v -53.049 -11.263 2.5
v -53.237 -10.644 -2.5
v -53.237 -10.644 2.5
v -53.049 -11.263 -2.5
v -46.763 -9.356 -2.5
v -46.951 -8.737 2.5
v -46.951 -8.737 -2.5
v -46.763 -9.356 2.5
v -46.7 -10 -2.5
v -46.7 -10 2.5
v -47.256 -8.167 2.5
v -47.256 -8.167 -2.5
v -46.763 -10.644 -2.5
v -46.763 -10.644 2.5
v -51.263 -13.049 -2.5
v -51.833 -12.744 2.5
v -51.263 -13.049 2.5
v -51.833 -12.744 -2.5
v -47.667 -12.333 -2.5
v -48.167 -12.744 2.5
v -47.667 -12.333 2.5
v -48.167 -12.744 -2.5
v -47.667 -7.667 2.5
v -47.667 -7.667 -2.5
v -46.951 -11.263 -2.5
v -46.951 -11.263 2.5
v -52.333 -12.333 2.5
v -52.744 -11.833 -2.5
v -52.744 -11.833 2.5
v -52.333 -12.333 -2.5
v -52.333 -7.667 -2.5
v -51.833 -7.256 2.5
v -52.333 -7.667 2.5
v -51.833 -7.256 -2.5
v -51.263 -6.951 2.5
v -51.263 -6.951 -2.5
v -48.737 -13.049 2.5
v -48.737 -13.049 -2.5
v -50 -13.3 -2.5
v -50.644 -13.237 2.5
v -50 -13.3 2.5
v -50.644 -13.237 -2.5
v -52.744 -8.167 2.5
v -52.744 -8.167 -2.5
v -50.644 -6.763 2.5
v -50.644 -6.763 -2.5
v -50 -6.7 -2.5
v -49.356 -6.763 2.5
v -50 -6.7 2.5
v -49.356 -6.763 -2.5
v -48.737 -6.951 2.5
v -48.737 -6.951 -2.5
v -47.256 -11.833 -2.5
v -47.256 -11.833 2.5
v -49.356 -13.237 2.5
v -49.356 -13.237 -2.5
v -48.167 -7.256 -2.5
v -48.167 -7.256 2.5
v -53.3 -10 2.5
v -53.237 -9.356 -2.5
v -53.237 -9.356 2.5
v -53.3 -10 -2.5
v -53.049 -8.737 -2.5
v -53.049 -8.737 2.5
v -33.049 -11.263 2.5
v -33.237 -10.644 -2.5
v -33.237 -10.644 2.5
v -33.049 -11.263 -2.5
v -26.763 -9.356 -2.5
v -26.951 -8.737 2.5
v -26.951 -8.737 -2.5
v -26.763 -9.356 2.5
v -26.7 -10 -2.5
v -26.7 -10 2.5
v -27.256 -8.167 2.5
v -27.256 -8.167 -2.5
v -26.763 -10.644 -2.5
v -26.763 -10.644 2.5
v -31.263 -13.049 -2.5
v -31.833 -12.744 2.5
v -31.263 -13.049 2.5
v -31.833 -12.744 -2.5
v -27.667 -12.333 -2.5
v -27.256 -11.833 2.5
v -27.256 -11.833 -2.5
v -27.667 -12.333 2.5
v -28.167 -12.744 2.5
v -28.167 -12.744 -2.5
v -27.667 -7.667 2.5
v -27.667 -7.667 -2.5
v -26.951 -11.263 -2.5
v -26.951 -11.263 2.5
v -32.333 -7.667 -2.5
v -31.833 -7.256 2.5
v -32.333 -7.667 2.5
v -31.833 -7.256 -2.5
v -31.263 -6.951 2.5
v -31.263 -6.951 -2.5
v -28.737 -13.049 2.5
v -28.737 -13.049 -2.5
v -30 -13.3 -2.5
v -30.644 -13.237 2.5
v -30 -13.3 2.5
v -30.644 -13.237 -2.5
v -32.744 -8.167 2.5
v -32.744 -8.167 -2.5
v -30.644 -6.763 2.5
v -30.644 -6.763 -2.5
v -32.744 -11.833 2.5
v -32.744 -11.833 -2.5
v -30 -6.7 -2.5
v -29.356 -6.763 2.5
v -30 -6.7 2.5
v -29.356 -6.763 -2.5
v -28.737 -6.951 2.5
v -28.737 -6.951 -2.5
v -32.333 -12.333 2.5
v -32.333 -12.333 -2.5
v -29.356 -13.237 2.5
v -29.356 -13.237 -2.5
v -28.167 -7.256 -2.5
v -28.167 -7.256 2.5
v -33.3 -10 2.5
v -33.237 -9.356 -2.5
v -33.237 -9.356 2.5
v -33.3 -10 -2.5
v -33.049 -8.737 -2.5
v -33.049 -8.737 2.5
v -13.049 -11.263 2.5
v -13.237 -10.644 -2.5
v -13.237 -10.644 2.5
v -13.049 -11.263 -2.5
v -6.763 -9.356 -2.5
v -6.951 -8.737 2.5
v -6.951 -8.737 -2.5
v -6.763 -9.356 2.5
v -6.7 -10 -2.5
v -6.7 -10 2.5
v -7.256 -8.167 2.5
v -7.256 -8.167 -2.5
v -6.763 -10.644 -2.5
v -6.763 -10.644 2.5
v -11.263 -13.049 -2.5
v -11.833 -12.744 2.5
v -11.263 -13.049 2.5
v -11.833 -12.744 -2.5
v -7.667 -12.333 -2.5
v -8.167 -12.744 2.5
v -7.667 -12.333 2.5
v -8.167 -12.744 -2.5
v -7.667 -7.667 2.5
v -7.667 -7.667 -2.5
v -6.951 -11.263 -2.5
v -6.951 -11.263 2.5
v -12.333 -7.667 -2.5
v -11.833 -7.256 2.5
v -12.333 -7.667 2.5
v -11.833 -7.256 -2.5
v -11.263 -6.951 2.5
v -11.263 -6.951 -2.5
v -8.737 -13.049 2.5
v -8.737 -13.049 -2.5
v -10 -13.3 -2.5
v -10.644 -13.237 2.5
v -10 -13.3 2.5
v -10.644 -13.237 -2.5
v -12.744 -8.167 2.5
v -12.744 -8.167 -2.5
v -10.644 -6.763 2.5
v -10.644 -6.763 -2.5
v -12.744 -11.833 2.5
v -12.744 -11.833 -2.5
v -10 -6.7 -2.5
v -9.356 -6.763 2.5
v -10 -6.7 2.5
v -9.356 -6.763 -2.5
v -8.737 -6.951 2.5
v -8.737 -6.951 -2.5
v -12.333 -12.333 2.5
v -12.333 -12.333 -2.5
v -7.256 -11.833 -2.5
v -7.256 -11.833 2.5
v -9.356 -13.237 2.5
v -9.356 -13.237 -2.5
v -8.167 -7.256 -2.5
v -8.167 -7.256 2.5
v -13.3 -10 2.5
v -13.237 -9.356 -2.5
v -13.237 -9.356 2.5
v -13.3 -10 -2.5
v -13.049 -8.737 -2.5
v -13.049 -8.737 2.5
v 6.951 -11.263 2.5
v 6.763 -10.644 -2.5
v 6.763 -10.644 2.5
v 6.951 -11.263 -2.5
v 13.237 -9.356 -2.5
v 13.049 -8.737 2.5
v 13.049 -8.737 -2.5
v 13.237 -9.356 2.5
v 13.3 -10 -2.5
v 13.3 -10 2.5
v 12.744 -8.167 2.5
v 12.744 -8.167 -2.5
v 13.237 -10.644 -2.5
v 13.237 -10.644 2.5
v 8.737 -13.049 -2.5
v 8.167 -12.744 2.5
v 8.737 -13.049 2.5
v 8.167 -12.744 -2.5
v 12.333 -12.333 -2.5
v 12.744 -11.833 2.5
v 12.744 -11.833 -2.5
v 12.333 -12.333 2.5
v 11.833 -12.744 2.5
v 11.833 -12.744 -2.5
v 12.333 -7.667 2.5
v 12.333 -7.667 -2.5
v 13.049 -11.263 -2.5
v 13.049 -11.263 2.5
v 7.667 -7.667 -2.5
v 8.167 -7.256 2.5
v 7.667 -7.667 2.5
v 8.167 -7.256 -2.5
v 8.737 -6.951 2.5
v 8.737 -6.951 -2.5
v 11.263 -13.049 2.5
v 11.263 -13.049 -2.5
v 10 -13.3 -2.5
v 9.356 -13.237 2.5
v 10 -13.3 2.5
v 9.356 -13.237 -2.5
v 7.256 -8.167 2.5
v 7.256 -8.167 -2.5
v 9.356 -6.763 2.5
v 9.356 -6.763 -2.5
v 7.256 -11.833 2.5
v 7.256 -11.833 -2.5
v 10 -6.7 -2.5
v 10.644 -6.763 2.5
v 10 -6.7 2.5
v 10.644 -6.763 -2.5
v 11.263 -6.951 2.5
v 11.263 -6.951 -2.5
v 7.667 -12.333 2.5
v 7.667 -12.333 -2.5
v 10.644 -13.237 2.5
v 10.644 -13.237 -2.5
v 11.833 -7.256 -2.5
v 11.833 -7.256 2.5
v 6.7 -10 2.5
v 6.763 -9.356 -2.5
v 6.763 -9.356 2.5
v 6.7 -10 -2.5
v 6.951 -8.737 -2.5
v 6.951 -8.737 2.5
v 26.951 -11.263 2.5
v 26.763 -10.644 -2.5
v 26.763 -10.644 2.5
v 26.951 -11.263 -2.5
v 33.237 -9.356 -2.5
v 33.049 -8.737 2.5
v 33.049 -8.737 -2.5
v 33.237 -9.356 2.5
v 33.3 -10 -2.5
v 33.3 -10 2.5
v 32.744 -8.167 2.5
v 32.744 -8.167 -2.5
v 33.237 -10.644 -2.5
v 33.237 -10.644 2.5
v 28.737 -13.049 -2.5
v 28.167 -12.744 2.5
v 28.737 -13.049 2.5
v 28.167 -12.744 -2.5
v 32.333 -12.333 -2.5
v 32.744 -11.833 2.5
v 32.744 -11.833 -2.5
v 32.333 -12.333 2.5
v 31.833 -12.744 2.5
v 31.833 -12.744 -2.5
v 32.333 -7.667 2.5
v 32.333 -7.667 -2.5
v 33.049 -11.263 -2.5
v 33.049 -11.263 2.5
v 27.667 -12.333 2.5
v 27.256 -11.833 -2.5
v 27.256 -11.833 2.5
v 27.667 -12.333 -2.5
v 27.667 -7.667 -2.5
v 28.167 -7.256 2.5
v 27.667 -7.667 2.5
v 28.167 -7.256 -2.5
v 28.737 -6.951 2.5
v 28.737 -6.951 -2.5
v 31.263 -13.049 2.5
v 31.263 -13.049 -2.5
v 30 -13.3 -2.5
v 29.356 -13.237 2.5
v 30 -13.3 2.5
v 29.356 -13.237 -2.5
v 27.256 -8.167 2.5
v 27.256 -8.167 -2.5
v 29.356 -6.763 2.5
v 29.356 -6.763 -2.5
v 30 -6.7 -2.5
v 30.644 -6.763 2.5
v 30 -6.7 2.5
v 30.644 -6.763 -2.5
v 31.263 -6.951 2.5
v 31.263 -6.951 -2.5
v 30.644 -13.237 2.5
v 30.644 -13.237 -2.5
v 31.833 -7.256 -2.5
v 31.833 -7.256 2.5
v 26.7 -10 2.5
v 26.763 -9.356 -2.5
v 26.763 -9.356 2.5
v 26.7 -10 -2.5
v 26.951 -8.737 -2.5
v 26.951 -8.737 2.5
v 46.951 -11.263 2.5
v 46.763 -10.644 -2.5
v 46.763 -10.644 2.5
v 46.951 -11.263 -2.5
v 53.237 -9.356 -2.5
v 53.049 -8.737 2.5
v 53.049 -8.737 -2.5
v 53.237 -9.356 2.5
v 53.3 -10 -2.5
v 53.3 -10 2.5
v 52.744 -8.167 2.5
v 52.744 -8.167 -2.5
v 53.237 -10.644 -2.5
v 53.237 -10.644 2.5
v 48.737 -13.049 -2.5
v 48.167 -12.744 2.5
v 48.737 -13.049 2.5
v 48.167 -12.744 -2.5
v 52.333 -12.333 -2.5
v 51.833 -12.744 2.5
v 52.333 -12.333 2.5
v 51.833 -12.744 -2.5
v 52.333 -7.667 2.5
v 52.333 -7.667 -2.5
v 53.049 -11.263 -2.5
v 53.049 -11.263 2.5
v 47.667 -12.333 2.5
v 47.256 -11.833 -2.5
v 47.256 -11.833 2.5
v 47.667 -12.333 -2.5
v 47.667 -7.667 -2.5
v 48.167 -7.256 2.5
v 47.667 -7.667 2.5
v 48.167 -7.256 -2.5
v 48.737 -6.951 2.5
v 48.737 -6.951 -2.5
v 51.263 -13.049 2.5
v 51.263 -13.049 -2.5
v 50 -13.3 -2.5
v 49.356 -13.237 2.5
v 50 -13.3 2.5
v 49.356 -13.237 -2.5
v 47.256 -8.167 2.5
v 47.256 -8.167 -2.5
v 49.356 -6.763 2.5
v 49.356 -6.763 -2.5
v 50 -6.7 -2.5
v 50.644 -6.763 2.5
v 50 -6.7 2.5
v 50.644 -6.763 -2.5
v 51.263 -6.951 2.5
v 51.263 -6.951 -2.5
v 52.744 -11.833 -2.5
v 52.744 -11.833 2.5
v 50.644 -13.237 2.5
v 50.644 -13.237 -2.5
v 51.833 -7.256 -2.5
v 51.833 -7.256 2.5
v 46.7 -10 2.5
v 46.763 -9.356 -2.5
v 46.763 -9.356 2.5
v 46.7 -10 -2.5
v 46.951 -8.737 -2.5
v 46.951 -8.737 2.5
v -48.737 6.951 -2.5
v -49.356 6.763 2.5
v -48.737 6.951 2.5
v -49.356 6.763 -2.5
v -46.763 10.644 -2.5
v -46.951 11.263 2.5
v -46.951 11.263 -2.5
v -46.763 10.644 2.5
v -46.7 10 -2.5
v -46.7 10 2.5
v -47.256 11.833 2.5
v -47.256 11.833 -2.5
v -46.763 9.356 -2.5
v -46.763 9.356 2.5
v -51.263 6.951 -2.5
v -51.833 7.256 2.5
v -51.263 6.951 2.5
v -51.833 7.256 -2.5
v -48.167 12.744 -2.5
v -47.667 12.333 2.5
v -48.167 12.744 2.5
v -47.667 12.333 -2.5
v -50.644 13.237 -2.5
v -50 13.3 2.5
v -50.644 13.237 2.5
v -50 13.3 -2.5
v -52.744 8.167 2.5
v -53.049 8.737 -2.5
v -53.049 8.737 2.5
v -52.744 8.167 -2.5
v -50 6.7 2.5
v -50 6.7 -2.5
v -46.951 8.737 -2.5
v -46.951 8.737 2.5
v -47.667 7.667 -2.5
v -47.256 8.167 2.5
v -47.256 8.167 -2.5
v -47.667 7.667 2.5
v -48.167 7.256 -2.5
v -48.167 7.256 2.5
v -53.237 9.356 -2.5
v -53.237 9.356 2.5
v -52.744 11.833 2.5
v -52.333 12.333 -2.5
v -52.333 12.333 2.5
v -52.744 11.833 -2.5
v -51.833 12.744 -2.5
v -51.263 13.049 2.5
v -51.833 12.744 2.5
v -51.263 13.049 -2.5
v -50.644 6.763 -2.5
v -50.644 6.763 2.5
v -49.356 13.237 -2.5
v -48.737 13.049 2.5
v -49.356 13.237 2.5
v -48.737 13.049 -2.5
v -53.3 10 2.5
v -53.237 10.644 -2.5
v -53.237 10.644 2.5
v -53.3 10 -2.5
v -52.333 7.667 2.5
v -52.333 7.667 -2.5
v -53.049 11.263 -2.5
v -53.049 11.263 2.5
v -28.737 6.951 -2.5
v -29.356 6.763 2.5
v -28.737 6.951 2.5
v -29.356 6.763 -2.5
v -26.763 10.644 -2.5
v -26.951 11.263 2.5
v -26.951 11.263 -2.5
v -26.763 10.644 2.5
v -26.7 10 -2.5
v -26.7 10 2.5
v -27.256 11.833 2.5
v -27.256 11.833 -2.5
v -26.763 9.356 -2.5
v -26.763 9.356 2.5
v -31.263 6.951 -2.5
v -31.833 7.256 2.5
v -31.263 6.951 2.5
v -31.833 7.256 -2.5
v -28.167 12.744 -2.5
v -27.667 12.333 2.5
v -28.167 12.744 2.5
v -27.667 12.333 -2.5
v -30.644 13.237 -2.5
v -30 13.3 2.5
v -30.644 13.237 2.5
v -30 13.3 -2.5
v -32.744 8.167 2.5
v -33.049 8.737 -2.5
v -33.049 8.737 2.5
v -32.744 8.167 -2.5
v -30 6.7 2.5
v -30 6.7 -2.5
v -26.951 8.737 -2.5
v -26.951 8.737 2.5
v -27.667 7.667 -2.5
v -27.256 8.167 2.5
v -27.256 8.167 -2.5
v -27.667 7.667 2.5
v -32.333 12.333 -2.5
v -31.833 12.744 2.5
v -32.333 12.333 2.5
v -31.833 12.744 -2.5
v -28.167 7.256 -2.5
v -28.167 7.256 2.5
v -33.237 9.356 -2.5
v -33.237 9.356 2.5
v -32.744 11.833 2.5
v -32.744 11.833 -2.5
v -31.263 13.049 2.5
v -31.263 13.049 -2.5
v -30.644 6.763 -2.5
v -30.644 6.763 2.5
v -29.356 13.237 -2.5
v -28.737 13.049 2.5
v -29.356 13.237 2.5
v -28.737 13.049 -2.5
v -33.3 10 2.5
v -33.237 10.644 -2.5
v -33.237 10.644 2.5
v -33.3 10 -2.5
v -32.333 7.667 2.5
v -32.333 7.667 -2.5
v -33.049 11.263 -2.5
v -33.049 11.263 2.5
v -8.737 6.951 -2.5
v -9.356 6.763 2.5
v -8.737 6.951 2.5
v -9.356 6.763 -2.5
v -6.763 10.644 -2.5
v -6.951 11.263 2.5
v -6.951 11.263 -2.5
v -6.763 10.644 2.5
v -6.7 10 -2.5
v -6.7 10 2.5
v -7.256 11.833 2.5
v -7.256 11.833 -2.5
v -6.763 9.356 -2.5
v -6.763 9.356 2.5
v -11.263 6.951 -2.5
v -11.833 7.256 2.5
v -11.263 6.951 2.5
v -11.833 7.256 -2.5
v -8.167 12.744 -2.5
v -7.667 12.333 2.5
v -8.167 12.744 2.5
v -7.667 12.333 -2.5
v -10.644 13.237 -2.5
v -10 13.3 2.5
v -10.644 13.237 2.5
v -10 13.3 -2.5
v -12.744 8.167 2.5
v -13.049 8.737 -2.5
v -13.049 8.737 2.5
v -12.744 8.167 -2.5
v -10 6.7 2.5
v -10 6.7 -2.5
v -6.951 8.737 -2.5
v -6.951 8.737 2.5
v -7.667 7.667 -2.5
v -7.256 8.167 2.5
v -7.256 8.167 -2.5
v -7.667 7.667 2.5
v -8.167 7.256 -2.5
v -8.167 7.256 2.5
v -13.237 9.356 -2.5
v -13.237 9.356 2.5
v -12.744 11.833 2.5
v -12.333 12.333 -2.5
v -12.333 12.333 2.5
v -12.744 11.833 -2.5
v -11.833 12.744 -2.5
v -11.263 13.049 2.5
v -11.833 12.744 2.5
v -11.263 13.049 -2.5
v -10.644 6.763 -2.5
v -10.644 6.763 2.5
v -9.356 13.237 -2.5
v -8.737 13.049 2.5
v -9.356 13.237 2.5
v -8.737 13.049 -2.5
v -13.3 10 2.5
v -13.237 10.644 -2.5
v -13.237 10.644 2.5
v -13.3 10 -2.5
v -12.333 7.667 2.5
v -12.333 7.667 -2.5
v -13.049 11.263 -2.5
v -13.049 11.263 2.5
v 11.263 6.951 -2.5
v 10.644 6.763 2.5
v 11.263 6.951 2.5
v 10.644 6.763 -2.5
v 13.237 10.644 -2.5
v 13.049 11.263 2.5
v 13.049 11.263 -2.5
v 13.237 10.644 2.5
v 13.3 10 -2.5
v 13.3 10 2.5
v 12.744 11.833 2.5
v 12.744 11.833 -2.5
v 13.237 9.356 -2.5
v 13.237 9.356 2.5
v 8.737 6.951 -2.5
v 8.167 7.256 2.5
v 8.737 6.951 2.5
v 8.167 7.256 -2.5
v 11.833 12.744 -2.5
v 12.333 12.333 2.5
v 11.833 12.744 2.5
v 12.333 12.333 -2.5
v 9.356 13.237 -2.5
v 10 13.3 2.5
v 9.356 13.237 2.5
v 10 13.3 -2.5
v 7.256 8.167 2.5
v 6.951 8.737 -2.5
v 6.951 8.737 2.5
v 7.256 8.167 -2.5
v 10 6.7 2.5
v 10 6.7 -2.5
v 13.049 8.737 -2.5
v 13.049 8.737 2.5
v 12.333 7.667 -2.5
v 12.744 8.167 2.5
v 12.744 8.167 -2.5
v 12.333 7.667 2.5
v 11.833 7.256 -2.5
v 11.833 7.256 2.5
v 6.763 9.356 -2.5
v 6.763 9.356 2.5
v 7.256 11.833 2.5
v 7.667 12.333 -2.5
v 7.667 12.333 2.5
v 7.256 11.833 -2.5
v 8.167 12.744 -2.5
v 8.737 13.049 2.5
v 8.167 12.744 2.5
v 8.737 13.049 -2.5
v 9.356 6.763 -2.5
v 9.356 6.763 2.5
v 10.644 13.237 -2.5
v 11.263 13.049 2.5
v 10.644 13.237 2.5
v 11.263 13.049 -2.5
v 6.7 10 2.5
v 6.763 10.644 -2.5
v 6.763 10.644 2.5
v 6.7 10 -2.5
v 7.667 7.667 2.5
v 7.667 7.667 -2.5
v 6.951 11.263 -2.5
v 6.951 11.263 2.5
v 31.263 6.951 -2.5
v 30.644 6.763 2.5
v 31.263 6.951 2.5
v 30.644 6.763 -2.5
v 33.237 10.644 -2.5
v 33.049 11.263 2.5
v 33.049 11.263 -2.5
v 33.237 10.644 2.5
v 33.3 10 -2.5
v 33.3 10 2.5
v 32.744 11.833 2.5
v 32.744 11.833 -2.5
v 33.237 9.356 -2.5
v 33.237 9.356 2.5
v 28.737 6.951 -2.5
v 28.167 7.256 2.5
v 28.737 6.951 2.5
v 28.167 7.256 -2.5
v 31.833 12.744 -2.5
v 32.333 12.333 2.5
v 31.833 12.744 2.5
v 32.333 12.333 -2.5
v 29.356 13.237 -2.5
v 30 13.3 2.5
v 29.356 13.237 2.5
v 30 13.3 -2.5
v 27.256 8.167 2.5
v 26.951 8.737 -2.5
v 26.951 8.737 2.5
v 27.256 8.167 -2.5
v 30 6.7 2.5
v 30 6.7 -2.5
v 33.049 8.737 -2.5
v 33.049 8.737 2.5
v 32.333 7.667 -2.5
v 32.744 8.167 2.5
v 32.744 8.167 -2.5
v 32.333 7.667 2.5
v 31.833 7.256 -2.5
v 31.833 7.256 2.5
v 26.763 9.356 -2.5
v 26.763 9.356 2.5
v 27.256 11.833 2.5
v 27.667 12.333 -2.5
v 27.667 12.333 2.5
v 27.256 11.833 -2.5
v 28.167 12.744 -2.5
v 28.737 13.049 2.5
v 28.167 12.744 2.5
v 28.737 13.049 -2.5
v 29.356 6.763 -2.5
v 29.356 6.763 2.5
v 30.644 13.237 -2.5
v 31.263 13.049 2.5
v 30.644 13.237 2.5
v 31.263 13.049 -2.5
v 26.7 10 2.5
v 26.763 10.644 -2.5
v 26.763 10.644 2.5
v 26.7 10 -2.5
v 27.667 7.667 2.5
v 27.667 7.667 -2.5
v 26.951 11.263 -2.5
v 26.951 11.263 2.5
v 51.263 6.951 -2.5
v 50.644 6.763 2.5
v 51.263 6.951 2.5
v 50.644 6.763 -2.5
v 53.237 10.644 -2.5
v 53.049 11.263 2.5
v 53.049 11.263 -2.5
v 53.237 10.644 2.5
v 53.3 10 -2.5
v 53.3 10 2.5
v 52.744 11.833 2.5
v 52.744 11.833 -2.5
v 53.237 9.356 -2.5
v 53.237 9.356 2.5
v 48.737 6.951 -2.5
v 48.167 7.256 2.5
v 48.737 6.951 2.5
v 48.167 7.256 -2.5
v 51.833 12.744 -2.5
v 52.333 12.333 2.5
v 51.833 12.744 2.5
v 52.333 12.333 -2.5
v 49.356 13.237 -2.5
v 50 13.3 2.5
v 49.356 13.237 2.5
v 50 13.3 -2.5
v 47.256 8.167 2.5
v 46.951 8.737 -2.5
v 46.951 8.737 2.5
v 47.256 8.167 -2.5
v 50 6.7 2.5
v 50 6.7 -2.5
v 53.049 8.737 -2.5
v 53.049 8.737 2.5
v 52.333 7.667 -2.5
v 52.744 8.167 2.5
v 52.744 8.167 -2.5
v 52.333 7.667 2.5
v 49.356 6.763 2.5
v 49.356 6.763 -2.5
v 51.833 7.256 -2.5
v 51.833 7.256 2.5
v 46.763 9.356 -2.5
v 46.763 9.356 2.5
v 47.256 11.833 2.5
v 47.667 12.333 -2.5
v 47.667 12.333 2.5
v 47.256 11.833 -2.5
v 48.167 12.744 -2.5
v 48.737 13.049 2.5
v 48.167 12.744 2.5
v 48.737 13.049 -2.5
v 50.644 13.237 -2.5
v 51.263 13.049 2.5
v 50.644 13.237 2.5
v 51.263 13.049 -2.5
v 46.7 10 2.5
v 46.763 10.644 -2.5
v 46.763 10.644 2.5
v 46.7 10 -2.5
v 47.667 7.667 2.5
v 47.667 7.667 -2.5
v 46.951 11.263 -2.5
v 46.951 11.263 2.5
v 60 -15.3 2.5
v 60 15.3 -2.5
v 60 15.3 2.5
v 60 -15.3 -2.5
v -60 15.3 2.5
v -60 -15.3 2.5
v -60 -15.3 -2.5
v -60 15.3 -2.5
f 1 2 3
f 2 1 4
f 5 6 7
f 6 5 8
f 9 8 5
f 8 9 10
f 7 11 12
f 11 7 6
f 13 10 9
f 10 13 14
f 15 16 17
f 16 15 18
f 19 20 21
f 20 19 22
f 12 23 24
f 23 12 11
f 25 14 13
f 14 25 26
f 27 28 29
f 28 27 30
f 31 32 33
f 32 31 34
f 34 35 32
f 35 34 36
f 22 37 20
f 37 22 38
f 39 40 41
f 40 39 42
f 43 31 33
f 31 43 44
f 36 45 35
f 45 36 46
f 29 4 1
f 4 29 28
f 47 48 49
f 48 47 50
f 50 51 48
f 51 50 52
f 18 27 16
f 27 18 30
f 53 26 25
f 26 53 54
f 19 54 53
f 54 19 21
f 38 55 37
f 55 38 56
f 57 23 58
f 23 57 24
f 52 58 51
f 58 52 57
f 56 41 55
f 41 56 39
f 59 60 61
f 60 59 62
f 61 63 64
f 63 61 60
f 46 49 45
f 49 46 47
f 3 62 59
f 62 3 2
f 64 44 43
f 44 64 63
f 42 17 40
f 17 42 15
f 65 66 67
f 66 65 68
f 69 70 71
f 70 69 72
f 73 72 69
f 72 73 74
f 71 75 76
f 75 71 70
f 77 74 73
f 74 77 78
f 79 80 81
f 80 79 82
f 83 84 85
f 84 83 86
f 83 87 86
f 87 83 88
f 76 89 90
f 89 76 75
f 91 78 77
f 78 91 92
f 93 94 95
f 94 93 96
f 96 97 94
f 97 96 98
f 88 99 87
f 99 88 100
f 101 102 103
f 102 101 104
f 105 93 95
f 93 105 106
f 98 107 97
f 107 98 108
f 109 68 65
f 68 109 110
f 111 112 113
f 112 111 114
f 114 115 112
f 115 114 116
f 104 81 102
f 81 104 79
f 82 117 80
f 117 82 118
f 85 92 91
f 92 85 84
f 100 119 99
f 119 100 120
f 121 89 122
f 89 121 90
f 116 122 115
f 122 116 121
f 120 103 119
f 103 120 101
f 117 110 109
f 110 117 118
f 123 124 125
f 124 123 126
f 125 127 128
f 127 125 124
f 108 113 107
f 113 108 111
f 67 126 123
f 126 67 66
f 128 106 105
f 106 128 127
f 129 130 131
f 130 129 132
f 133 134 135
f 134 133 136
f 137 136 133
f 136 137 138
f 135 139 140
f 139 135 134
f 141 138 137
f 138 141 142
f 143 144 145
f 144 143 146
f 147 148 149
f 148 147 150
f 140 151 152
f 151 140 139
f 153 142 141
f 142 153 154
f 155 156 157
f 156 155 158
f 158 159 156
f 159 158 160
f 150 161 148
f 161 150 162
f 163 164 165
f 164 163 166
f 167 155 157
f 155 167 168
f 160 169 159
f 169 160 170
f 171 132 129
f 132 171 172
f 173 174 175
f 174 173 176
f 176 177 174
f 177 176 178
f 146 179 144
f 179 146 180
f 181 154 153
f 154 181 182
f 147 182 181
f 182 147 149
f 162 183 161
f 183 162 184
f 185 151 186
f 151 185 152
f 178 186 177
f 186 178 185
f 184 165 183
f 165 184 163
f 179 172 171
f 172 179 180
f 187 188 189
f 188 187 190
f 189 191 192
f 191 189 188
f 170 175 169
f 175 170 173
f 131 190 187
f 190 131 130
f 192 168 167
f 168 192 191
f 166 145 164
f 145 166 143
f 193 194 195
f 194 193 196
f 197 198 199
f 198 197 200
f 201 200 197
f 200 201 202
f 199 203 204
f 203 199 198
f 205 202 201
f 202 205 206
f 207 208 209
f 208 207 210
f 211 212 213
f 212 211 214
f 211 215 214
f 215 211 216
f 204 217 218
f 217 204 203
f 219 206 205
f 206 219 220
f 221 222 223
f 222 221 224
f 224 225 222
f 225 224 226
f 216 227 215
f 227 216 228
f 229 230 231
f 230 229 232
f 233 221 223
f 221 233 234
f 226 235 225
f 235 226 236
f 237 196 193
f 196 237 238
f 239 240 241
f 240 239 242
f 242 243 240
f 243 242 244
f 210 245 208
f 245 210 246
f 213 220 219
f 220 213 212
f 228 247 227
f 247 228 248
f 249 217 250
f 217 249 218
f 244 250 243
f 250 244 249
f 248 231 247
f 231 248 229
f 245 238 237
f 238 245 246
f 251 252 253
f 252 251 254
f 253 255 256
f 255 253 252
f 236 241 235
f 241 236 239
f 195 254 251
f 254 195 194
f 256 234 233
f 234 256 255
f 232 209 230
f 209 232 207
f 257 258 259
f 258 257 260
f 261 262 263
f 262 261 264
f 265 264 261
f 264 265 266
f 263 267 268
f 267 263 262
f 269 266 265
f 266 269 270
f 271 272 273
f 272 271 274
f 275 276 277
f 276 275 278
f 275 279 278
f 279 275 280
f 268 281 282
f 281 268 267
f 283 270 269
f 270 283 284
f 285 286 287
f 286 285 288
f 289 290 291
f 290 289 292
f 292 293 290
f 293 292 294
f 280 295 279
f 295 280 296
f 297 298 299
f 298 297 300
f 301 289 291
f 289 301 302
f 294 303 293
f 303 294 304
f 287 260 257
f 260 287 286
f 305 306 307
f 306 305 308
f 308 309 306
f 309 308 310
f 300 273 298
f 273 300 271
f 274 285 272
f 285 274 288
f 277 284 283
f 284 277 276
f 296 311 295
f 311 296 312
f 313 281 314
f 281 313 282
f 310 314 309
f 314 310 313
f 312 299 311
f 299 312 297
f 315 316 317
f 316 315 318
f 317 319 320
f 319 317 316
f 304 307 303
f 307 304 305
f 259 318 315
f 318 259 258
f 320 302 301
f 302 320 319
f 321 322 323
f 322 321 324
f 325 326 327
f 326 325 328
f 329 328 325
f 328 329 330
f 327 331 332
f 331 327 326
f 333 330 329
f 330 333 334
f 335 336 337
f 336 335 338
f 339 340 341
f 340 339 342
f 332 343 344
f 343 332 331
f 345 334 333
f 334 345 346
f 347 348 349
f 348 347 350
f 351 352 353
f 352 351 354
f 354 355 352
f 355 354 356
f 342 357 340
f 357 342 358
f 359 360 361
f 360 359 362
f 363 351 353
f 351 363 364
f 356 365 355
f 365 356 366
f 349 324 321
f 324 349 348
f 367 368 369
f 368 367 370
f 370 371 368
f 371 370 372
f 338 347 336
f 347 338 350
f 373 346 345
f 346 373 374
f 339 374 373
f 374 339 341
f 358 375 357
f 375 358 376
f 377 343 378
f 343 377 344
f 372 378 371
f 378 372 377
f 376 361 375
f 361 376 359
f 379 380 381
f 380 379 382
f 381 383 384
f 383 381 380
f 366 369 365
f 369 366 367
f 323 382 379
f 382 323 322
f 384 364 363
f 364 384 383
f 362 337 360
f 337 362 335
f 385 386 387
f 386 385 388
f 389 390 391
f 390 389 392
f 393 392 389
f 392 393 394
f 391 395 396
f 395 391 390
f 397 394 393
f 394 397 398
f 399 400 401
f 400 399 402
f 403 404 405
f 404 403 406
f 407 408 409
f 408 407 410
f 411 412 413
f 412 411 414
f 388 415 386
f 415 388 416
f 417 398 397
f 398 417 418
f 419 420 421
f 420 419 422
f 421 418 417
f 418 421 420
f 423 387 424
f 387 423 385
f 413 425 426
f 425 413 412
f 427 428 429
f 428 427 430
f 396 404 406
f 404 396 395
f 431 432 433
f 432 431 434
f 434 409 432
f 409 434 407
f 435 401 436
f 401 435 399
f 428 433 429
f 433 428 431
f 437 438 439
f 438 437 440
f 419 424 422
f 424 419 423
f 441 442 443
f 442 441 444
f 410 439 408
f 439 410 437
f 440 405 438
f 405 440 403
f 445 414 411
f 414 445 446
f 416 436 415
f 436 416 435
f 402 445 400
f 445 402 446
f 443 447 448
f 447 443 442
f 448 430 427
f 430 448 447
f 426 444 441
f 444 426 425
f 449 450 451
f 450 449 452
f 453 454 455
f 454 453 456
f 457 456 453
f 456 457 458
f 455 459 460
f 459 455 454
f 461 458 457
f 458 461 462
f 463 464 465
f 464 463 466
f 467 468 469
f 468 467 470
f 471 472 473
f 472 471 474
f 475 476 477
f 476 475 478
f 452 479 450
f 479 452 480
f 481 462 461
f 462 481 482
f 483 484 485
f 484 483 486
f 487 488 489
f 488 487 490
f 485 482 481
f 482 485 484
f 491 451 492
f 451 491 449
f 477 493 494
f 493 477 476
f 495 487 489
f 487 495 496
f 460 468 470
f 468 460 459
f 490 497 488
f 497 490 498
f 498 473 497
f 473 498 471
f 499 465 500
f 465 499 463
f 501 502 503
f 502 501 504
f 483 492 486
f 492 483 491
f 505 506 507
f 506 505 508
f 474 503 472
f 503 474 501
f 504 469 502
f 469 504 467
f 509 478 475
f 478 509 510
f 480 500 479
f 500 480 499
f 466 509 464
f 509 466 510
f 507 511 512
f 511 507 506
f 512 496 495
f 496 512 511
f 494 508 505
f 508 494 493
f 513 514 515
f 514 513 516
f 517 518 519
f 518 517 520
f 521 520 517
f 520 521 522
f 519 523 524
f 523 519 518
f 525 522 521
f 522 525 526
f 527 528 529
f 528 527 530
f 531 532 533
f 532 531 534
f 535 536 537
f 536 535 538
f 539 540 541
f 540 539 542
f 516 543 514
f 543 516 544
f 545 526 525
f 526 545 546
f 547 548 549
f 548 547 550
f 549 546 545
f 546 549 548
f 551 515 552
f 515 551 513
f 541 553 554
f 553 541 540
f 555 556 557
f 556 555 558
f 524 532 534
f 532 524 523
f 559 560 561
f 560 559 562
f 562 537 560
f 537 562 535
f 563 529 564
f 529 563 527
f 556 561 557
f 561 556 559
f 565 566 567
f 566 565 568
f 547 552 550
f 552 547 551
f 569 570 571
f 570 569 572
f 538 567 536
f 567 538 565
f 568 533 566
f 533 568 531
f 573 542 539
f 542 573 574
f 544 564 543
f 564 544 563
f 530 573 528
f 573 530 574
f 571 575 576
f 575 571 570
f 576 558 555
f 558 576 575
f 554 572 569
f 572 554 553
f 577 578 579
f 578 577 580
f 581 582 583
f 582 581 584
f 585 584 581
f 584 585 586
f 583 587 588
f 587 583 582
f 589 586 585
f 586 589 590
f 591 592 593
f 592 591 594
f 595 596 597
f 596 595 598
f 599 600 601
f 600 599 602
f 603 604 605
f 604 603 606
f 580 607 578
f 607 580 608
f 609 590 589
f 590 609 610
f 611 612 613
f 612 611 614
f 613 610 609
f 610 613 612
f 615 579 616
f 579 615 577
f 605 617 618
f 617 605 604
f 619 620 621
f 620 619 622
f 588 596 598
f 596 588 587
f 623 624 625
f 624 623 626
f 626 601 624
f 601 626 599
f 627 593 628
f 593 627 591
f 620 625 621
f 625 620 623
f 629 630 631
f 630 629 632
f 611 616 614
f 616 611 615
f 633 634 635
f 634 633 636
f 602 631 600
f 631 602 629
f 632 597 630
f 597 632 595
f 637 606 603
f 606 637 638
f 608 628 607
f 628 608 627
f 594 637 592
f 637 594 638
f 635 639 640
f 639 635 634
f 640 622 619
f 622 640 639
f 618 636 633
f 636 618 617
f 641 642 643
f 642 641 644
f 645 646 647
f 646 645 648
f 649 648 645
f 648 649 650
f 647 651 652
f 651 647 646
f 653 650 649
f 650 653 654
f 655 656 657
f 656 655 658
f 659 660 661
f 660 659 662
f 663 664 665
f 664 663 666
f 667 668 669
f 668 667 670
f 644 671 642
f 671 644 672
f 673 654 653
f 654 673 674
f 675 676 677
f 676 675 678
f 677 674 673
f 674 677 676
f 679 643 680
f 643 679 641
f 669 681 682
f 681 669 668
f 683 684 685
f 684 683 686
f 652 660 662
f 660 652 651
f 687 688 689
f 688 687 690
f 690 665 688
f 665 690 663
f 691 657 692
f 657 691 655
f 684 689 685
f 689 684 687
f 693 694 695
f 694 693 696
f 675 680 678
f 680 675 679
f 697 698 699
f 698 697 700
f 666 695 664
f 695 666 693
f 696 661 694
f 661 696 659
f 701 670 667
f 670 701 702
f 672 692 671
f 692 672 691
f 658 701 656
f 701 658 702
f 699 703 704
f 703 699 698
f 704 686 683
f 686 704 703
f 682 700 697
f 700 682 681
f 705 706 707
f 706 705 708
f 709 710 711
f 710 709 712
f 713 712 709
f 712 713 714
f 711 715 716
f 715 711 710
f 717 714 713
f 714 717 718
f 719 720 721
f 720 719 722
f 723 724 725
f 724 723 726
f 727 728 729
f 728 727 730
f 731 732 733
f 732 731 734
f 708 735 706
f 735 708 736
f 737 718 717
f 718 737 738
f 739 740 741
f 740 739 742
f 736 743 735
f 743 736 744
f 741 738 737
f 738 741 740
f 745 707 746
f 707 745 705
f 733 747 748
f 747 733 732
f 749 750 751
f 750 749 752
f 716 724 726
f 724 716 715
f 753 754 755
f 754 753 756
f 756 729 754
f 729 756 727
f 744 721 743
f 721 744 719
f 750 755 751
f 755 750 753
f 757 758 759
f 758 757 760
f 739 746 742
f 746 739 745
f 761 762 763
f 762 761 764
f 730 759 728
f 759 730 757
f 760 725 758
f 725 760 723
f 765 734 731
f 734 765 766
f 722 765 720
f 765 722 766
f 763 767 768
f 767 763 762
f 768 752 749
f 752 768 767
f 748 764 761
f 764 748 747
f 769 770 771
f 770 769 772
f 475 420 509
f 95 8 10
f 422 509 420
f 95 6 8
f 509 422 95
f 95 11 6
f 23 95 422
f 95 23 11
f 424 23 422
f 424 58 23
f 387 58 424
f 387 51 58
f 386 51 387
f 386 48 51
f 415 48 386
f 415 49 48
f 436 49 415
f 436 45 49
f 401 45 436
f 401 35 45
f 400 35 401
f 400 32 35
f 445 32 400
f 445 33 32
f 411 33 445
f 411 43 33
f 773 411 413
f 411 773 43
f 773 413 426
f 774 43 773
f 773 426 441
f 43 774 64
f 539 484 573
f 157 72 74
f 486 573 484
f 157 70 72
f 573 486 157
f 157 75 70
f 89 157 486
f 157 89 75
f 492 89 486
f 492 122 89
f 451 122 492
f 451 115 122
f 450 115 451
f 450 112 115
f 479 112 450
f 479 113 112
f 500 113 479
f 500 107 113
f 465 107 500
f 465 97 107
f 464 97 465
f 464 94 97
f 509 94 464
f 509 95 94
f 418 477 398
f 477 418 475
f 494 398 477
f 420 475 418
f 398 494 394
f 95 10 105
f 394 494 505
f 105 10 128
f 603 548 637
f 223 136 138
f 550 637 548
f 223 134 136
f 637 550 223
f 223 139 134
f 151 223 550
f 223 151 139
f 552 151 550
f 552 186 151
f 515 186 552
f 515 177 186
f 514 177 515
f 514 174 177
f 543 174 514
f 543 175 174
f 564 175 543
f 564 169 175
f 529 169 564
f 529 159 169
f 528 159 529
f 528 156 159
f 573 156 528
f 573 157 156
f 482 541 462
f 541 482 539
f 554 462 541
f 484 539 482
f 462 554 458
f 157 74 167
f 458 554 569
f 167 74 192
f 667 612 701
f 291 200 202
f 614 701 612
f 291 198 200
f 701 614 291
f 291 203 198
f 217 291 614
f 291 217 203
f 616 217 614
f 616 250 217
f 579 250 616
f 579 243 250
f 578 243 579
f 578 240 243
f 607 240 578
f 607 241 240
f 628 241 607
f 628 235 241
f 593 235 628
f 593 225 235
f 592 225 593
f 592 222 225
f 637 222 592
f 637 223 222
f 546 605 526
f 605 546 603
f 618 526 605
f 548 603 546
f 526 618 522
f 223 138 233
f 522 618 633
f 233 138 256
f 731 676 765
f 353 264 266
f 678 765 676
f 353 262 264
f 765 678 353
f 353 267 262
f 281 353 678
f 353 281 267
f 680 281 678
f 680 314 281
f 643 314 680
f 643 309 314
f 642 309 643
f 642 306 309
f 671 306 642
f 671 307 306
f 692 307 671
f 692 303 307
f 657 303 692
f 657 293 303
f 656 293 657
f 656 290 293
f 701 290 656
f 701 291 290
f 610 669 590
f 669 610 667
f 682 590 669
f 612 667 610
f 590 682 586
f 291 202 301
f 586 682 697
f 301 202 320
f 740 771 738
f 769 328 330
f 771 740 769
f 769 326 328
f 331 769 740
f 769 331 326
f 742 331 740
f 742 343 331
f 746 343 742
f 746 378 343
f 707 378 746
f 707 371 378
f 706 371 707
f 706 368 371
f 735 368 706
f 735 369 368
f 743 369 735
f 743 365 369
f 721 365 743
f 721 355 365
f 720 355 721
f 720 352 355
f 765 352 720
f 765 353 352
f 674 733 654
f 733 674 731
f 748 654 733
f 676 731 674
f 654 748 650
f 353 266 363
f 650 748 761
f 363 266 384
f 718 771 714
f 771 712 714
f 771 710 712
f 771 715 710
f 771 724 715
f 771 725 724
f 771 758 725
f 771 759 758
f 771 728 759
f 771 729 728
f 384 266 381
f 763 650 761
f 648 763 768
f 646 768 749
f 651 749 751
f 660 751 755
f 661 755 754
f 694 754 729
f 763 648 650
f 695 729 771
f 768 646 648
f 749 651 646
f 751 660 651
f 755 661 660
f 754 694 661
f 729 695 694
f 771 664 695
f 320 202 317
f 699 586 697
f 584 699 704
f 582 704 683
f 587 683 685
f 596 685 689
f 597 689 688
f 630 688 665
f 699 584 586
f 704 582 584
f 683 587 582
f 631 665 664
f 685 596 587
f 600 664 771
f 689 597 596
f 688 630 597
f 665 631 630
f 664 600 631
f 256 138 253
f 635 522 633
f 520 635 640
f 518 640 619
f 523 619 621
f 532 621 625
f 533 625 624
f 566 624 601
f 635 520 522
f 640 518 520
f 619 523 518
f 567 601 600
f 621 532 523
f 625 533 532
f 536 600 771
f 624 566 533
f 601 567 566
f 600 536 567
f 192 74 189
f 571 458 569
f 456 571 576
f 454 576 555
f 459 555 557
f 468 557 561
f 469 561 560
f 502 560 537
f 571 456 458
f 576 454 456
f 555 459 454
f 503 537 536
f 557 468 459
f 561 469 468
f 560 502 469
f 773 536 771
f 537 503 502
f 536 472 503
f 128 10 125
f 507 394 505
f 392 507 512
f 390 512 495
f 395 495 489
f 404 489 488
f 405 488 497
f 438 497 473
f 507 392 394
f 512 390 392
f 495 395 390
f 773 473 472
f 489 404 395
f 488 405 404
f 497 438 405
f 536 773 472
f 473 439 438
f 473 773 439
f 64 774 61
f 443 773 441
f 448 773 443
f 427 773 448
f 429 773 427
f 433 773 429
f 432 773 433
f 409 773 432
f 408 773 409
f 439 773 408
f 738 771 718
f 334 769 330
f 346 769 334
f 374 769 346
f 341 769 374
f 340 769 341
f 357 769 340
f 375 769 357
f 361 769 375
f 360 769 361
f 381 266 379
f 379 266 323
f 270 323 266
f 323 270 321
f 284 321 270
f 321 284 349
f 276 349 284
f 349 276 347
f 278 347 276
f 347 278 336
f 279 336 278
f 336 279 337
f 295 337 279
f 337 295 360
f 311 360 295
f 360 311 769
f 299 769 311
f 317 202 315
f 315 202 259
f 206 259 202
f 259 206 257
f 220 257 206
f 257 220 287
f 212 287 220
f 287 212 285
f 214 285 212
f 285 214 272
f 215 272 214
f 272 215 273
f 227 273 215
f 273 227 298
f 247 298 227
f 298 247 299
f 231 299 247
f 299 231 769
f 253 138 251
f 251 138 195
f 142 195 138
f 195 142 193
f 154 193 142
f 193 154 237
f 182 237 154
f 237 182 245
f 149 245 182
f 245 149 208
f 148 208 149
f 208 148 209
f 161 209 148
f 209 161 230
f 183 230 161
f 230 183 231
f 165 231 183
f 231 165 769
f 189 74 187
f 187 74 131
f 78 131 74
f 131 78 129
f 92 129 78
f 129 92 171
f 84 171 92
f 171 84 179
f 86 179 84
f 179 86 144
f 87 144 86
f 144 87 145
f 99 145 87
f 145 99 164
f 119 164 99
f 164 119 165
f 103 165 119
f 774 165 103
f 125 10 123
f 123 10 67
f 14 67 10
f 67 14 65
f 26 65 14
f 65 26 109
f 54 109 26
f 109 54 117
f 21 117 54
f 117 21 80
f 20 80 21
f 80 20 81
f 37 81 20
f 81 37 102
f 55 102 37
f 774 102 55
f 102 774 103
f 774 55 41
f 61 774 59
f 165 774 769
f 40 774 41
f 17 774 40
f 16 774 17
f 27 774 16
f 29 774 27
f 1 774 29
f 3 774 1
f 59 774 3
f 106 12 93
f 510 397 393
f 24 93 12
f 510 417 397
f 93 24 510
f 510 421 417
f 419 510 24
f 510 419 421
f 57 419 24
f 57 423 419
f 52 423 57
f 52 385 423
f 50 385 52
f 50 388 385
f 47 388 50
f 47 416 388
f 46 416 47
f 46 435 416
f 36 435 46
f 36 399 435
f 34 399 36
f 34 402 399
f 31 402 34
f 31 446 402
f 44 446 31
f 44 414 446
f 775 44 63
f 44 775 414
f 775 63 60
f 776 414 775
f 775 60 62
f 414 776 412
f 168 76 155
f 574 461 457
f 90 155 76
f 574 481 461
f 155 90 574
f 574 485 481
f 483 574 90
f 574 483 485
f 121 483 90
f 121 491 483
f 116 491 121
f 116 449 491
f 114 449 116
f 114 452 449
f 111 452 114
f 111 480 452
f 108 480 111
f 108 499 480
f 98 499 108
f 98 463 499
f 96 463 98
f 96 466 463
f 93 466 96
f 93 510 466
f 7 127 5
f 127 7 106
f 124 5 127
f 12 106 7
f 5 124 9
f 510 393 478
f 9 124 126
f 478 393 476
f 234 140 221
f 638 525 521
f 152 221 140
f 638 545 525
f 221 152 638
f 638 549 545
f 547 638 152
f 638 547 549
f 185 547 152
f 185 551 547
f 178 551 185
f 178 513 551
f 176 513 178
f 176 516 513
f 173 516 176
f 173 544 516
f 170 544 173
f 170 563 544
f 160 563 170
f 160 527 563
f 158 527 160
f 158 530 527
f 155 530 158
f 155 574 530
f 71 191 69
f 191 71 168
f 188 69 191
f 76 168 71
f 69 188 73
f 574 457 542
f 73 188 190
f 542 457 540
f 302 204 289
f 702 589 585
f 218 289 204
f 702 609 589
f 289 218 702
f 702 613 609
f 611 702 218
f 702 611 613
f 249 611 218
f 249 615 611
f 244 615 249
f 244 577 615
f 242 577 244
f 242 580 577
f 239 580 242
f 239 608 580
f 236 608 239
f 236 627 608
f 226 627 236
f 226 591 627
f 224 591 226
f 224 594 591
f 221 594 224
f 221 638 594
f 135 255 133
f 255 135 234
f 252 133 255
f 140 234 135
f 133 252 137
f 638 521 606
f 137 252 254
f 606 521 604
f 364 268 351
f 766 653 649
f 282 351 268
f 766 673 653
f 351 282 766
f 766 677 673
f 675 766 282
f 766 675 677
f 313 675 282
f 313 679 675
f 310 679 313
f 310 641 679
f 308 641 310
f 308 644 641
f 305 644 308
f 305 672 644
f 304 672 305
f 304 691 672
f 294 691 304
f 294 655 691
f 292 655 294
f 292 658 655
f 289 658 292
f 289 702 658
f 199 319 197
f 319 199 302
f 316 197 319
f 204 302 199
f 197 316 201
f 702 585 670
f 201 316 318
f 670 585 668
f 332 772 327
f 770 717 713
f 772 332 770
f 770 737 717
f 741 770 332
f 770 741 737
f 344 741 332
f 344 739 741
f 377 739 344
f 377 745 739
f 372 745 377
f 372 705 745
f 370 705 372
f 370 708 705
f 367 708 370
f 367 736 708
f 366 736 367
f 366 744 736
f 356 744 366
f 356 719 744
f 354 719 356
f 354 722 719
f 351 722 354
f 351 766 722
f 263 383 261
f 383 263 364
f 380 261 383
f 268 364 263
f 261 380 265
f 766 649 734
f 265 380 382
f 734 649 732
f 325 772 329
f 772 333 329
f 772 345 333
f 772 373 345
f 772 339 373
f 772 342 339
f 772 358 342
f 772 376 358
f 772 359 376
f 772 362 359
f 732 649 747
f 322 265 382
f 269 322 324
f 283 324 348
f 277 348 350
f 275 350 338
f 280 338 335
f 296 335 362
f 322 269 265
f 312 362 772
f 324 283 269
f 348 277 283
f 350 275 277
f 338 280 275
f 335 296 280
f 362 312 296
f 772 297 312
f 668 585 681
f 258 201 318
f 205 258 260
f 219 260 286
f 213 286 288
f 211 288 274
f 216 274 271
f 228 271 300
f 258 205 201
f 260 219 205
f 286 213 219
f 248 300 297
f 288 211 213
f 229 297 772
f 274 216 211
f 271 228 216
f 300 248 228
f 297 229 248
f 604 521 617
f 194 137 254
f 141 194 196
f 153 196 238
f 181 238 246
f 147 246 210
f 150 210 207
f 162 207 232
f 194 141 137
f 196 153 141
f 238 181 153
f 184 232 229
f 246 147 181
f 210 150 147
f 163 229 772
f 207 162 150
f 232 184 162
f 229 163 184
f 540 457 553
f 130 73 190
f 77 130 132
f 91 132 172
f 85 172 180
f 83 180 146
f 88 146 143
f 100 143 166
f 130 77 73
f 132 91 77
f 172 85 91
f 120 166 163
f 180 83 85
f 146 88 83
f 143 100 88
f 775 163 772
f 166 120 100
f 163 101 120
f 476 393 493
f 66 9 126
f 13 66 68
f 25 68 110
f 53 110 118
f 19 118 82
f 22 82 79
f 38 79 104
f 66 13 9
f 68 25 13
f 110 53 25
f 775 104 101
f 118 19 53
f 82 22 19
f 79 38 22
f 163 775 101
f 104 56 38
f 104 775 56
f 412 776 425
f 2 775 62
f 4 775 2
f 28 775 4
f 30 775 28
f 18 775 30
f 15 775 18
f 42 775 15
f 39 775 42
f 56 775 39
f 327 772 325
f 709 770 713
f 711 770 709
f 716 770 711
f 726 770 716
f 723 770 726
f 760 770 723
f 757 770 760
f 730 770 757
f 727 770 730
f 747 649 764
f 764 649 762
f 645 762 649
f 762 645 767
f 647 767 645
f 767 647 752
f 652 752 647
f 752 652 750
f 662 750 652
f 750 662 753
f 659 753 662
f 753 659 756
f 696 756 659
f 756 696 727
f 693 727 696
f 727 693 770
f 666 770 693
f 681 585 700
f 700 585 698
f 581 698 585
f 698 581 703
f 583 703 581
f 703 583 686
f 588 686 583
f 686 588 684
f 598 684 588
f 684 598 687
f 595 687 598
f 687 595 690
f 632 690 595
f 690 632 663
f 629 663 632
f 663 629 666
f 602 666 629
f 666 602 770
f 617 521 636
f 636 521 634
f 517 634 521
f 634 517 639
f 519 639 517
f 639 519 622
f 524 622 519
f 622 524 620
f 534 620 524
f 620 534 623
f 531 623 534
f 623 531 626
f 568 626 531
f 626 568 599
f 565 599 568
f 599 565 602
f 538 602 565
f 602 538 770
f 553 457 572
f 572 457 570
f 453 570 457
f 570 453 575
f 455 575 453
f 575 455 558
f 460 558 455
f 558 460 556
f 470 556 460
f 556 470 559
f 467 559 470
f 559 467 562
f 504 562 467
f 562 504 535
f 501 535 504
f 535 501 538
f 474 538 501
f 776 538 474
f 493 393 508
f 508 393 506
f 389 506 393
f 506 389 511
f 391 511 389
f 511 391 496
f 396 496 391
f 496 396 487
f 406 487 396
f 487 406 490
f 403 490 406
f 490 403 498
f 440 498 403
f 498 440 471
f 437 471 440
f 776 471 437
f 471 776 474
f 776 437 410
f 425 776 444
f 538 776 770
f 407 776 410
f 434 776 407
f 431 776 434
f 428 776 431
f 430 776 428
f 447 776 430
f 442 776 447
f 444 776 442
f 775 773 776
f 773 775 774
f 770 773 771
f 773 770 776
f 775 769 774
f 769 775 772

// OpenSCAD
$fn = 32;

// ----------------------------------------------------------------------
// Hole bar, 6 x Ø6.6
// tworows layout, 10 mm edge offset
// ----------------------------------------------------------------------

// --- parameters (mm) ---
bar_w = 30.6;     // bar width (Y)
bar_t = 5;        // bar thickness (Z)
holes = 6;        // holes per row
hole_d = 6.6;     // hole diameter
edge = 10;        // offset from the bar end to the first hole
pitch = 20;       // pitch between neighbouring holes
row_offset = 20;  // distance between the two rows

// --- derived feature positions (mm) ---
span = (holes - 1) * pitch;   // = 100   distance between the end holes
bar_l = span + 2 * edge;      // = 120   overall bar length
start_x = -bar_l / 2 + edge;  // = -50   X of the first hole
feature_centers = [
  [start_x + 0 * pitch, -row_offset / 2],
  [start_x + 1 * pitch, -row_offset / 2],
  [start_x + 2 * pitch, -row_offset / 2],
  [start_x + 3 * pitch, -row_offset / 2],
  [start_x + 4 * pitch, -row_offset / 2],
  [start_x + 5 * pitch, -row_offset / 2]
];   // hole centres of the first row
row2_centers = [
  [start_x + 0 * pitch, row_offset / 2],
  [start_x + 1 * pitch, row_offset / 2],
  [start_x + 2 * pitch, row_offset / 2],
  [start_x + 3 * pitch, row_offset / 2],
  [start_x + 4 * pitch, row_offset / 2],
  [start_x + 5 * pitch, row_offset / 2]
];   // hole centres of the second row

// bar with two rows of holes, both read from their own centre arrays
difference() {
  translate([-bar_l / 2, -bar_w / 2, -bar_t / 2]) cube([bar_l, bar_w, bar_t]);
  for (centre = feature_centers)
    translate([centre[0], centre[1], 0])
      cylinder(d = hole_d, h = bar_t + 2, center = true);
  for (centre = row2_centers)
    translate([centre[0], centre[1], 0])
      cylinder(d = hole_d, h = bar_t + 2, center = true);
}
